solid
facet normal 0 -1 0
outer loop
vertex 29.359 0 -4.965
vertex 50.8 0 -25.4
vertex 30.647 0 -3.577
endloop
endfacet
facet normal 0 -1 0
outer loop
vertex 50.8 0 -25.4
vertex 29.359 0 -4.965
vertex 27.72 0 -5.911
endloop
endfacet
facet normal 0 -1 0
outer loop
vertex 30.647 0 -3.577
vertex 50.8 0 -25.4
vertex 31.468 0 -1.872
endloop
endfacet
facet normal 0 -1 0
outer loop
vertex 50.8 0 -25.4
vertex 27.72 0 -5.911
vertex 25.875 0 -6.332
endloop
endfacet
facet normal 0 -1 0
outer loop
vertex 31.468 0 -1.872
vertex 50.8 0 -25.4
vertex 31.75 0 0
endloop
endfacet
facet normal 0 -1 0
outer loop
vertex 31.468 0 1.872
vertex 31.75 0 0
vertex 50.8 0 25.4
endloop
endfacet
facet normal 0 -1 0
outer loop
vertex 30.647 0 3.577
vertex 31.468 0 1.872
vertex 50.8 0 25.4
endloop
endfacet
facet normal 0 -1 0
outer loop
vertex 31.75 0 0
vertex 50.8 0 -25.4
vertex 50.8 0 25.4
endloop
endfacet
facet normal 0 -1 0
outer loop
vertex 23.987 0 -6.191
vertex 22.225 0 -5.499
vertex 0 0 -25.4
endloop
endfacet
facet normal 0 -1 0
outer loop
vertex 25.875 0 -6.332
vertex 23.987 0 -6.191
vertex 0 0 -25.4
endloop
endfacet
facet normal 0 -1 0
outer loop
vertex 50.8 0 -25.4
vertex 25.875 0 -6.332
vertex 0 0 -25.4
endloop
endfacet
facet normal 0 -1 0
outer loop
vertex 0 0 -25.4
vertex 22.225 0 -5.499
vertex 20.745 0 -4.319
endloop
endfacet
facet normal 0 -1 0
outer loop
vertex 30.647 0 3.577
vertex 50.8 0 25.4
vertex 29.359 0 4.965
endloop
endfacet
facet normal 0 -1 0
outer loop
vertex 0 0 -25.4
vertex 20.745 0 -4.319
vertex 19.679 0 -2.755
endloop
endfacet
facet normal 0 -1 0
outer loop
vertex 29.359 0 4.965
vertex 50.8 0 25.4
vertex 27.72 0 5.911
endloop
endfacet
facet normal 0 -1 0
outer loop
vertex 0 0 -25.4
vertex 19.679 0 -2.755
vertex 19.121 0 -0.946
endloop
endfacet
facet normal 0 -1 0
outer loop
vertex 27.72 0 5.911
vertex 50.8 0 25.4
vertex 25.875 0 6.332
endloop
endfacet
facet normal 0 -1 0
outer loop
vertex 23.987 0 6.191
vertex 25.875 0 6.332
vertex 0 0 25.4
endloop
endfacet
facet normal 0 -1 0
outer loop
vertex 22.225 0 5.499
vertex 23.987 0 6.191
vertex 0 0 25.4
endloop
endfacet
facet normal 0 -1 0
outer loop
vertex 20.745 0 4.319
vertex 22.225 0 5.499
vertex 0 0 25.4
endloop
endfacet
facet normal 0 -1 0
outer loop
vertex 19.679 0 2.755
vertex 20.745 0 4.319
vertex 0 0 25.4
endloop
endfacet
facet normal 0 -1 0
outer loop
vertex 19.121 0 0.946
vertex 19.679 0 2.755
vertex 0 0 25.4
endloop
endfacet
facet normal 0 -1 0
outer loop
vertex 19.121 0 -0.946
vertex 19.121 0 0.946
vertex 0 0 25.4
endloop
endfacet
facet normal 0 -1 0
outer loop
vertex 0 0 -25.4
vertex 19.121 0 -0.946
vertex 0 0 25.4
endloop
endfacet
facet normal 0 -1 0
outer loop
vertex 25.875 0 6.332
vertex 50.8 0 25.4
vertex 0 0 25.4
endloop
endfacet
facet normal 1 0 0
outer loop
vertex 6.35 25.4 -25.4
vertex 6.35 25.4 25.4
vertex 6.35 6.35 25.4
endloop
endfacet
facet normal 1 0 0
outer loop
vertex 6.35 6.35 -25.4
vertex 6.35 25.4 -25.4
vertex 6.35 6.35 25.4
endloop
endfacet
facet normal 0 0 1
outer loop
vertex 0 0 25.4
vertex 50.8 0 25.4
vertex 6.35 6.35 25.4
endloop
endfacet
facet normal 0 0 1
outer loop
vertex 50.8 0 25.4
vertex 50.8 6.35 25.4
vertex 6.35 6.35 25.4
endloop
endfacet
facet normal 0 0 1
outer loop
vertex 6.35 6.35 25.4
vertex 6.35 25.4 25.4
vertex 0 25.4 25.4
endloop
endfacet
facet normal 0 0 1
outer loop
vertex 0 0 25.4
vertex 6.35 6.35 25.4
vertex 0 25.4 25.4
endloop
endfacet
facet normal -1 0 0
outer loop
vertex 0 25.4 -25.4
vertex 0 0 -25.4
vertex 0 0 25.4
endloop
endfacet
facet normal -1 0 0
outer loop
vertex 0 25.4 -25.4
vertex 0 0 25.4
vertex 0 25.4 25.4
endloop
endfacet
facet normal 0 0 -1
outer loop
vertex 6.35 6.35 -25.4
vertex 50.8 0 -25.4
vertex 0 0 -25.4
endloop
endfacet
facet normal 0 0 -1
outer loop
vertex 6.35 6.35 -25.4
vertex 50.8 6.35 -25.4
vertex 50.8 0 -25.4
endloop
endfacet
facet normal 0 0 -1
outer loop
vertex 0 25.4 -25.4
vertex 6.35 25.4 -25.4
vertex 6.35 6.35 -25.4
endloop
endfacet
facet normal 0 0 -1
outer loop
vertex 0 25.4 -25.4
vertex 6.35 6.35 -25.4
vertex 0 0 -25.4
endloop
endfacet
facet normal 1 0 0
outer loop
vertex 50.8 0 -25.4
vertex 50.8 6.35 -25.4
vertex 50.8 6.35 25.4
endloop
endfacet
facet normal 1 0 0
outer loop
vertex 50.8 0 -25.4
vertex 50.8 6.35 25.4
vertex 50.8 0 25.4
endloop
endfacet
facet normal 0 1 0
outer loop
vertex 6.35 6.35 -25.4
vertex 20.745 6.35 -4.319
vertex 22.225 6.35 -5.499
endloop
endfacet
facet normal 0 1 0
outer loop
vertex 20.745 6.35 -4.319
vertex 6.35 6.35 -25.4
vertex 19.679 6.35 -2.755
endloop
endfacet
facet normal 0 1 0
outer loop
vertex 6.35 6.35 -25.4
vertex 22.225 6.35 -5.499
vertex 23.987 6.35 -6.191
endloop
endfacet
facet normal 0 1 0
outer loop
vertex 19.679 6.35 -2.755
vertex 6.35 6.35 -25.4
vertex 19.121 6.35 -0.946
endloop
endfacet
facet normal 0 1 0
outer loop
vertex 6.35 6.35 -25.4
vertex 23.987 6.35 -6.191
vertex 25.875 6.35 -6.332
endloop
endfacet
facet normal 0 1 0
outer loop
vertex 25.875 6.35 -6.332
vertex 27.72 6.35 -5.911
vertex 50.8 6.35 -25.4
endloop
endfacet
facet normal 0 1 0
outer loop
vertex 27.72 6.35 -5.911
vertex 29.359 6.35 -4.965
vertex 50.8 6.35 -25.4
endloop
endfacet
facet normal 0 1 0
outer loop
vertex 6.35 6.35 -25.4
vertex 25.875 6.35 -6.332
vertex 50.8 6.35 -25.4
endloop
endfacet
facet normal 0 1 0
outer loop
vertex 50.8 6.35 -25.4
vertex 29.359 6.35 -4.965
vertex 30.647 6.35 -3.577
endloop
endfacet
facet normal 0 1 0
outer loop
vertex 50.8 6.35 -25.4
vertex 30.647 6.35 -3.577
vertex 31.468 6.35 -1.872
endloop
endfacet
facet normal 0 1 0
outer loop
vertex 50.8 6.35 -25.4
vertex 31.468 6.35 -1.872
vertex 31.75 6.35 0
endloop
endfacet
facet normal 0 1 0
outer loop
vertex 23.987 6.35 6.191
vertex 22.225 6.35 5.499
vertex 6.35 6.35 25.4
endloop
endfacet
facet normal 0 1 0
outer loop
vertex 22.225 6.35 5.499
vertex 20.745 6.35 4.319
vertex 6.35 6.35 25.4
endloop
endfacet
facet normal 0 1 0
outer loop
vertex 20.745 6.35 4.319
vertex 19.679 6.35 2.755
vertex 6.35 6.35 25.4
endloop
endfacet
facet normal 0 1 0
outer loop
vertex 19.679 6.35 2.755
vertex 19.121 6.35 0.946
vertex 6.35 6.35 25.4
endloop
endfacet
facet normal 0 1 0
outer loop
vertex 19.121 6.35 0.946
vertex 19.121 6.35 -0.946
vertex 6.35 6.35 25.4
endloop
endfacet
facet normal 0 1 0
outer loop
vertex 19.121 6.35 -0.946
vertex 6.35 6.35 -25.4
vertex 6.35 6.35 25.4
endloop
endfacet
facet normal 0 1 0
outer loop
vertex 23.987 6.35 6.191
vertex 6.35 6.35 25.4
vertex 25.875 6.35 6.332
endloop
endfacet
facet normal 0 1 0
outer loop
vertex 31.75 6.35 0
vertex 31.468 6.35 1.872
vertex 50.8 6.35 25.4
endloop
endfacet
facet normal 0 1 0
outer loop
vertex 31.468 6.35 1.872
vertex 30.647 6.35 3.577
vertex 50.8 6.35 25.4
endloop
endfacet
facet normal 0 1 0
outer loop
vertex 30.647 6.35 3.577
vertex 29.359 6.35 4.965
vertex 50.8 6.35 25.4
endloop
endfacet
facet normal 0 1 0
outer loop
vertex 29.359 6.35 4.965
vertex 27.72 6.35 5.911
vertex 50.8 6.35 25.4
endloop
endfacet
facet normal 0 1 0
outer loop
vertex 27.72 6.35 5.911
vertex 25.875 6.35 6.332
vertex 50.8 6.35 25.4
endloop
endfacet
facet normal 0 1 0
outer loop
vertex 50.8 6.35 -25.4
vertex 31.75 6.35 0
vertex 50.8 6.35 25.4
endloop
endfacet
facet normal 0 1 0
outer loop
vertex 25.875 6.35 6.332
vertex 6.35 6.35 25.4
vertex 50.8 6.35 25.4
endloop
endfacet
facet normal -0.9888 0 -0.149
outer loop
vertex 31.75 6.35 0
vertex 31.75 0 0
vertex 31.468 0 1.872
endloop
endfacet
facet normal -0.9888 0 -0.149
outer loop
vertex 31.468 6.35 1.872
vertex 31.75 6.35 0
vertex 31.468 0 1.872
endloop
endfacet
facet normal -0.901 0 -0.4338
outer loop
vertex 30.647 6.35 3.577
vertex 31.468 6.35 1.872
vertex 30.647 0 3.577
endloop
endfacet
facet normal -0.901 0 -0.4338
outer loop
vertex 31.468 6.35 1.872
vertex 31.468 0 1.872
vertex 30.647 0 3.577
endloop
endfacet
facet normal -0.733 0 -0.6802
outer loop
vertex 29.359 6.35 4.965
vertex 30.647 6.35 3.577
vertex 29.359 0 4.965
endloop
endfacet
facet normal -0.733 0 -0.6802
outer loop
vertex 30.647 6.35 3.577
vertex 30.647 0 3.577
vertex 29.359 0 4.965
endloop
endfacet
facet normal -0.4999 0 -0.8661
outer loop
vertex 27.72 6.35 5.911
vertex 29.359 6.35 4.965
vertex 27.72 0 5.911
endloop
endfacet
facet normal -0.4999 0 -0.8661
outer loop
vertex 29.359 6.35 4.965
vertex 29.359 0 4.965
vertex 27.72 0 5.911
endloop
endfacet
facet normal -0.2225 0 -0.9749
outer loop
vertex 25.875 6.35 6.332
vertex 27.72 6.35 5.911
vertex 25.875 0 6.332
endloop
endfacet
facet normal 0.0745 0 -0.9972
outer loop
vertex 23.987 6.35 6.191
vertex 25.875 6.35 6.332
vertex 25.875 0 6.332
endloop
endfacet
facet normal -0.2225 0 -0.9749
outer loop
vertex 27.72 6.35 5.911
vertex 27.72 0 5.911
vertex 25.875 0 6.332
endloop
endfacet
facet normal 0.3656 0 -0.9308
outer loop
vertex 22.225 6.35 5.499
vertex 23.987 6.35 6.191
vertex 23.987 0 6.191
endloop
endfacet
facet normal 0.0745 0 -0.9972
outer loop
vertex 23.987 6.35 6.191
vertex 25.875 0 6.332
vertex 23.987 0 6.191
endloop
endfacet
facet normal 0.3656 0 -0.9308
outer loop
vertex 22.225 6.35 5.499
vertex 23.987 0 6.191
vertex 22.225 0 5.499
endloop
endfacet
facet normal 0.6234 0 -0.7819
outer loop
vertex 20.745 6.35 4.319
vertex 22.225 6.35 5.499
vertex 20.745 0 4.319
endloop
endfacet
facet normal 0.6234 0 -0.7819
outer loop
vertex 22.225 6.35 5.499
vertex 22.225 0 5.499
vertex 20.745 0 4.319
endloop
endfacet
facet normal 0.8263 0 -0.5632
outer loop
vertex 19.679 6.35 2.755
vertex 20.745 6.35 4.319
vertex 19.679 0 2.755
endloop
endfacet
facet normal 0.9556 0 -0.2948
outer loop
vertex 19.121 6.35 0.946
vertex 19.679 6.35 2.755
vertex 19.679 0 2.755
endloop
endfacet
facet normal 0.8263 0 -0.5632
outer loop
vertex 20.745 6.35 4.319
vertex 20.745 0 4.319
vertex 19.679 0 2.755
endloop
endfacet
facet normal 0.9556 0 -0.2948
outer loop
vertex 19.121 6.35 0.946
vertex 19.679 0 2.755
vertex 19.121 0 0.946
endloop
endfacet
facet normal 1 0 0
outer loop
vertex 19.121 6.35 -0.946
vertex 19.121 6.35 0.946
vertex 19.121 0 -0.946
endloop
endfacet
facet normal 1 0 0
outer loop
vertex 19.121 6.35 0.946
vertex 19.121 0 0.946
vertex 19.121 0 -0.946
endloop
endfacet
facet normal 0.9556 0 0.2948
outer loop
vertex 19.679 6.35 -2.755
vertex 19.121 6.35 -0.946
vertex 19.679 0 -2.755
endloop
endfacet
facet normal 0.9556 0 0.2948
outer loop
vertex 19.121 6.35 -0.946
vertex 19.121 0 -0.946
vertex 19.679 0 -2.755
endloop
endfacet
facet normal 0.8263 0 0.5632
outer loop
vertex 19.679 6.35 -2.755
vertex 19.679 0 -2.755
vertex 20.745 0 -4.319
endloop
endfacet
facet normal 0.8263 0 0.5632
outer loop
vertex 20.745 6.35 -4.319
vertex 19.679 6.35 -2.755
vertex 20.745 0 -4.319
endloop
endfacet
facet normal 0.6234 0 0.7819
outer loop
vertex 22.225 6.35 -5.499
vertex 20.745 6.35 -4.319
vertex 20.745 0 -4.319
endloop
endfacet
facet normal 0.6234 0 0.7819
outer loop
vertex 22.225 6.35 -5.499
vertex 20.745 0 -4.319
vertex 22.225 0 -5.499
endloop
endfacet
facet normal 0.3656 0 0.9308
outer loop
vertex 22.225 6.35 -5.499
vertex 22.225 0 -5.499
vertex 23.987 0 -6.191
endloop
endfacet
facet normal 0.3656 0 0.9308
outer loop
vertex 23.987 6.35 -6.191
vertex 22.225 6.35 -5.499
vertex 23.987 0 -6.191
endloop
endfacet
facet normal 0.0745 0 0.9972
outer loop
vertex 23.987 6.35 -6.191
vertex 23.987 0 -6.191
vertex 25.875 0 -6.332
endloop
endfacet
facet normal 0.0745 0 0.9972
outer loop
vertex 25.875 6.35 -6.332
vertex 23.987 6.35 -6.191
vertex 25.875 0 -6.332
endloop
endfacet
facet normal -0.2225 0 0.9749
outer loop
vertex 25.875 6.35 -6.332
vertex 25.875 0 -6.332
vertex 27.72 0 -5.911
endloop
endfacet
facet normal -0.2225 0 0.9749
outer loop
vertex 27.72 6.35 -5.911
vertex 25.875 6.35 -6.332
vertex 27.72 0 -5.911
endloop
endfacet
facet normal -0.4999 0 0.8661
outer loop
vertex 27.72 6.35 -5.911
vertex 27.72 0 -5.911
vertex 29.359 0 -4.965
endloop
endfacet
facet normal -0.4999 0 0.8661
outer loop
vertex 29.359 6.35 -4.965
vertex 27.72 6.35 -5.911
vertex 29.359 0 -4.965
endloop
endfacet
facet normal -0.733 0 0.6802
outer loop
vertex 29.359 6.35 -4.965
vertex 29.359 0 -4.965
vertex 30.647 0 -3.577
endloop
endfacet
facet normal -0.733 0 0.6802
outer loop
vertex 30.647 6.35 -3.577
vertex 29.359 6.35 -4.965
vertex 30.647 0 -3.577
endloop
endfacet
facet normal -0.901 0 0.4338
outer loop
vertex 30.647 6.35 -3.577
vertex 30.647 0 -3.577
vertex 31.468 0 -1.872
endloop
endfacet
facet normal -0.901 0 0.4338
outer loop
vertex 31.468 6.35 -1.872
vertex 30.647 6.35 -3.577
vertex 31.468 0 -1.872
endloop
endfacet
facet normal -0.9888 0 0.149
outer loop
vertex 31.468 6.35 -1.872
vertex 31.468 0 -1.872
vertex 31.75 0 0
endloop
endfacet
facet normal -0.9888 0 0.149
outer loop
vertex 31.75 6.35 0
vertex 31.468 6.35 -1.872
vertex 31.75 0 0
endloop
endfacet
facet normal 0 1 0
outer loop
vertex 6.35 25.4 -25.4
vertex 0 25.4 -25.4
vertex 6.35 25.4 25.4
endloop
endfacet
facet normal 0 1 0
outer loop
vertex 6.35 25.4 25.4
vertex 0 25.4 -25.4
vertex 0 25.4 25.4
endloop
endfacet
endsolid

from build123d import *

# Parameters (mm, degrees)
BOSS_EXTRUDE1_DEPTH      = 25.4
BOSS_EXTRUDE1_DEPTH_BACK = 25.4
SKETCH2_W                = 50.8
SKETCH2_H                = 25.4
CUT_EXTRUDE1_DEPTH       = 51.8
SKETCH3_R                = 6.35
CUT_EXTRUDE2_DEPTH       = 1
CUT_EXTRUDE2_DEPTH_BACK  = 26.4


with BuildPart() as part:
    # Sketch1 → Boss-Extrude1 (new body, two sides)
    with BuildSketch(Plane.XY) as boss_extrude1_sk:
        Polygon((0, 0), (0, 50.8), (6.35, 50.8), (6.35, 6.35), (50.8, 6.35), (50.8, 0), align=None)
    extrude(amount=BOSS_EXTRUDE1_DEPTH)
    extrude(boss_extrude1_sk.sketch, amount=-BOSS_EXTRUDE1_DEPTH_BACK)

    # Sketch2 → Cut-Extrude1 (cut, through all)
    with BuildSketch(Plane.ZY):
        with Locations((0, 38.1)):
            Rectangle(SKETCH2_W, SKETCH2_H)
    extrude(amount=-CUT_EXTRUDE1_DEPTH, mode=Mode.SUBTRACT)

    # Sketch3 → Cut-Extrude2 (cut, two sides)
    with BuildSketch(Plane.XZ) as cut_extrude2_sk:
        with Locations((25.4, 0)):
            Circle(SKETCH3_R)
    extrude(amount=CUT_EXTRUDE2_DEPTH, mode=Mode.SUBTRACT)
    extrude(cut_extrude2_sk.sketch, amount=-CUT_EXTRUDE2_DEPTH_BACK, mode=Mode.SUBTRACT)


solid = part.part
